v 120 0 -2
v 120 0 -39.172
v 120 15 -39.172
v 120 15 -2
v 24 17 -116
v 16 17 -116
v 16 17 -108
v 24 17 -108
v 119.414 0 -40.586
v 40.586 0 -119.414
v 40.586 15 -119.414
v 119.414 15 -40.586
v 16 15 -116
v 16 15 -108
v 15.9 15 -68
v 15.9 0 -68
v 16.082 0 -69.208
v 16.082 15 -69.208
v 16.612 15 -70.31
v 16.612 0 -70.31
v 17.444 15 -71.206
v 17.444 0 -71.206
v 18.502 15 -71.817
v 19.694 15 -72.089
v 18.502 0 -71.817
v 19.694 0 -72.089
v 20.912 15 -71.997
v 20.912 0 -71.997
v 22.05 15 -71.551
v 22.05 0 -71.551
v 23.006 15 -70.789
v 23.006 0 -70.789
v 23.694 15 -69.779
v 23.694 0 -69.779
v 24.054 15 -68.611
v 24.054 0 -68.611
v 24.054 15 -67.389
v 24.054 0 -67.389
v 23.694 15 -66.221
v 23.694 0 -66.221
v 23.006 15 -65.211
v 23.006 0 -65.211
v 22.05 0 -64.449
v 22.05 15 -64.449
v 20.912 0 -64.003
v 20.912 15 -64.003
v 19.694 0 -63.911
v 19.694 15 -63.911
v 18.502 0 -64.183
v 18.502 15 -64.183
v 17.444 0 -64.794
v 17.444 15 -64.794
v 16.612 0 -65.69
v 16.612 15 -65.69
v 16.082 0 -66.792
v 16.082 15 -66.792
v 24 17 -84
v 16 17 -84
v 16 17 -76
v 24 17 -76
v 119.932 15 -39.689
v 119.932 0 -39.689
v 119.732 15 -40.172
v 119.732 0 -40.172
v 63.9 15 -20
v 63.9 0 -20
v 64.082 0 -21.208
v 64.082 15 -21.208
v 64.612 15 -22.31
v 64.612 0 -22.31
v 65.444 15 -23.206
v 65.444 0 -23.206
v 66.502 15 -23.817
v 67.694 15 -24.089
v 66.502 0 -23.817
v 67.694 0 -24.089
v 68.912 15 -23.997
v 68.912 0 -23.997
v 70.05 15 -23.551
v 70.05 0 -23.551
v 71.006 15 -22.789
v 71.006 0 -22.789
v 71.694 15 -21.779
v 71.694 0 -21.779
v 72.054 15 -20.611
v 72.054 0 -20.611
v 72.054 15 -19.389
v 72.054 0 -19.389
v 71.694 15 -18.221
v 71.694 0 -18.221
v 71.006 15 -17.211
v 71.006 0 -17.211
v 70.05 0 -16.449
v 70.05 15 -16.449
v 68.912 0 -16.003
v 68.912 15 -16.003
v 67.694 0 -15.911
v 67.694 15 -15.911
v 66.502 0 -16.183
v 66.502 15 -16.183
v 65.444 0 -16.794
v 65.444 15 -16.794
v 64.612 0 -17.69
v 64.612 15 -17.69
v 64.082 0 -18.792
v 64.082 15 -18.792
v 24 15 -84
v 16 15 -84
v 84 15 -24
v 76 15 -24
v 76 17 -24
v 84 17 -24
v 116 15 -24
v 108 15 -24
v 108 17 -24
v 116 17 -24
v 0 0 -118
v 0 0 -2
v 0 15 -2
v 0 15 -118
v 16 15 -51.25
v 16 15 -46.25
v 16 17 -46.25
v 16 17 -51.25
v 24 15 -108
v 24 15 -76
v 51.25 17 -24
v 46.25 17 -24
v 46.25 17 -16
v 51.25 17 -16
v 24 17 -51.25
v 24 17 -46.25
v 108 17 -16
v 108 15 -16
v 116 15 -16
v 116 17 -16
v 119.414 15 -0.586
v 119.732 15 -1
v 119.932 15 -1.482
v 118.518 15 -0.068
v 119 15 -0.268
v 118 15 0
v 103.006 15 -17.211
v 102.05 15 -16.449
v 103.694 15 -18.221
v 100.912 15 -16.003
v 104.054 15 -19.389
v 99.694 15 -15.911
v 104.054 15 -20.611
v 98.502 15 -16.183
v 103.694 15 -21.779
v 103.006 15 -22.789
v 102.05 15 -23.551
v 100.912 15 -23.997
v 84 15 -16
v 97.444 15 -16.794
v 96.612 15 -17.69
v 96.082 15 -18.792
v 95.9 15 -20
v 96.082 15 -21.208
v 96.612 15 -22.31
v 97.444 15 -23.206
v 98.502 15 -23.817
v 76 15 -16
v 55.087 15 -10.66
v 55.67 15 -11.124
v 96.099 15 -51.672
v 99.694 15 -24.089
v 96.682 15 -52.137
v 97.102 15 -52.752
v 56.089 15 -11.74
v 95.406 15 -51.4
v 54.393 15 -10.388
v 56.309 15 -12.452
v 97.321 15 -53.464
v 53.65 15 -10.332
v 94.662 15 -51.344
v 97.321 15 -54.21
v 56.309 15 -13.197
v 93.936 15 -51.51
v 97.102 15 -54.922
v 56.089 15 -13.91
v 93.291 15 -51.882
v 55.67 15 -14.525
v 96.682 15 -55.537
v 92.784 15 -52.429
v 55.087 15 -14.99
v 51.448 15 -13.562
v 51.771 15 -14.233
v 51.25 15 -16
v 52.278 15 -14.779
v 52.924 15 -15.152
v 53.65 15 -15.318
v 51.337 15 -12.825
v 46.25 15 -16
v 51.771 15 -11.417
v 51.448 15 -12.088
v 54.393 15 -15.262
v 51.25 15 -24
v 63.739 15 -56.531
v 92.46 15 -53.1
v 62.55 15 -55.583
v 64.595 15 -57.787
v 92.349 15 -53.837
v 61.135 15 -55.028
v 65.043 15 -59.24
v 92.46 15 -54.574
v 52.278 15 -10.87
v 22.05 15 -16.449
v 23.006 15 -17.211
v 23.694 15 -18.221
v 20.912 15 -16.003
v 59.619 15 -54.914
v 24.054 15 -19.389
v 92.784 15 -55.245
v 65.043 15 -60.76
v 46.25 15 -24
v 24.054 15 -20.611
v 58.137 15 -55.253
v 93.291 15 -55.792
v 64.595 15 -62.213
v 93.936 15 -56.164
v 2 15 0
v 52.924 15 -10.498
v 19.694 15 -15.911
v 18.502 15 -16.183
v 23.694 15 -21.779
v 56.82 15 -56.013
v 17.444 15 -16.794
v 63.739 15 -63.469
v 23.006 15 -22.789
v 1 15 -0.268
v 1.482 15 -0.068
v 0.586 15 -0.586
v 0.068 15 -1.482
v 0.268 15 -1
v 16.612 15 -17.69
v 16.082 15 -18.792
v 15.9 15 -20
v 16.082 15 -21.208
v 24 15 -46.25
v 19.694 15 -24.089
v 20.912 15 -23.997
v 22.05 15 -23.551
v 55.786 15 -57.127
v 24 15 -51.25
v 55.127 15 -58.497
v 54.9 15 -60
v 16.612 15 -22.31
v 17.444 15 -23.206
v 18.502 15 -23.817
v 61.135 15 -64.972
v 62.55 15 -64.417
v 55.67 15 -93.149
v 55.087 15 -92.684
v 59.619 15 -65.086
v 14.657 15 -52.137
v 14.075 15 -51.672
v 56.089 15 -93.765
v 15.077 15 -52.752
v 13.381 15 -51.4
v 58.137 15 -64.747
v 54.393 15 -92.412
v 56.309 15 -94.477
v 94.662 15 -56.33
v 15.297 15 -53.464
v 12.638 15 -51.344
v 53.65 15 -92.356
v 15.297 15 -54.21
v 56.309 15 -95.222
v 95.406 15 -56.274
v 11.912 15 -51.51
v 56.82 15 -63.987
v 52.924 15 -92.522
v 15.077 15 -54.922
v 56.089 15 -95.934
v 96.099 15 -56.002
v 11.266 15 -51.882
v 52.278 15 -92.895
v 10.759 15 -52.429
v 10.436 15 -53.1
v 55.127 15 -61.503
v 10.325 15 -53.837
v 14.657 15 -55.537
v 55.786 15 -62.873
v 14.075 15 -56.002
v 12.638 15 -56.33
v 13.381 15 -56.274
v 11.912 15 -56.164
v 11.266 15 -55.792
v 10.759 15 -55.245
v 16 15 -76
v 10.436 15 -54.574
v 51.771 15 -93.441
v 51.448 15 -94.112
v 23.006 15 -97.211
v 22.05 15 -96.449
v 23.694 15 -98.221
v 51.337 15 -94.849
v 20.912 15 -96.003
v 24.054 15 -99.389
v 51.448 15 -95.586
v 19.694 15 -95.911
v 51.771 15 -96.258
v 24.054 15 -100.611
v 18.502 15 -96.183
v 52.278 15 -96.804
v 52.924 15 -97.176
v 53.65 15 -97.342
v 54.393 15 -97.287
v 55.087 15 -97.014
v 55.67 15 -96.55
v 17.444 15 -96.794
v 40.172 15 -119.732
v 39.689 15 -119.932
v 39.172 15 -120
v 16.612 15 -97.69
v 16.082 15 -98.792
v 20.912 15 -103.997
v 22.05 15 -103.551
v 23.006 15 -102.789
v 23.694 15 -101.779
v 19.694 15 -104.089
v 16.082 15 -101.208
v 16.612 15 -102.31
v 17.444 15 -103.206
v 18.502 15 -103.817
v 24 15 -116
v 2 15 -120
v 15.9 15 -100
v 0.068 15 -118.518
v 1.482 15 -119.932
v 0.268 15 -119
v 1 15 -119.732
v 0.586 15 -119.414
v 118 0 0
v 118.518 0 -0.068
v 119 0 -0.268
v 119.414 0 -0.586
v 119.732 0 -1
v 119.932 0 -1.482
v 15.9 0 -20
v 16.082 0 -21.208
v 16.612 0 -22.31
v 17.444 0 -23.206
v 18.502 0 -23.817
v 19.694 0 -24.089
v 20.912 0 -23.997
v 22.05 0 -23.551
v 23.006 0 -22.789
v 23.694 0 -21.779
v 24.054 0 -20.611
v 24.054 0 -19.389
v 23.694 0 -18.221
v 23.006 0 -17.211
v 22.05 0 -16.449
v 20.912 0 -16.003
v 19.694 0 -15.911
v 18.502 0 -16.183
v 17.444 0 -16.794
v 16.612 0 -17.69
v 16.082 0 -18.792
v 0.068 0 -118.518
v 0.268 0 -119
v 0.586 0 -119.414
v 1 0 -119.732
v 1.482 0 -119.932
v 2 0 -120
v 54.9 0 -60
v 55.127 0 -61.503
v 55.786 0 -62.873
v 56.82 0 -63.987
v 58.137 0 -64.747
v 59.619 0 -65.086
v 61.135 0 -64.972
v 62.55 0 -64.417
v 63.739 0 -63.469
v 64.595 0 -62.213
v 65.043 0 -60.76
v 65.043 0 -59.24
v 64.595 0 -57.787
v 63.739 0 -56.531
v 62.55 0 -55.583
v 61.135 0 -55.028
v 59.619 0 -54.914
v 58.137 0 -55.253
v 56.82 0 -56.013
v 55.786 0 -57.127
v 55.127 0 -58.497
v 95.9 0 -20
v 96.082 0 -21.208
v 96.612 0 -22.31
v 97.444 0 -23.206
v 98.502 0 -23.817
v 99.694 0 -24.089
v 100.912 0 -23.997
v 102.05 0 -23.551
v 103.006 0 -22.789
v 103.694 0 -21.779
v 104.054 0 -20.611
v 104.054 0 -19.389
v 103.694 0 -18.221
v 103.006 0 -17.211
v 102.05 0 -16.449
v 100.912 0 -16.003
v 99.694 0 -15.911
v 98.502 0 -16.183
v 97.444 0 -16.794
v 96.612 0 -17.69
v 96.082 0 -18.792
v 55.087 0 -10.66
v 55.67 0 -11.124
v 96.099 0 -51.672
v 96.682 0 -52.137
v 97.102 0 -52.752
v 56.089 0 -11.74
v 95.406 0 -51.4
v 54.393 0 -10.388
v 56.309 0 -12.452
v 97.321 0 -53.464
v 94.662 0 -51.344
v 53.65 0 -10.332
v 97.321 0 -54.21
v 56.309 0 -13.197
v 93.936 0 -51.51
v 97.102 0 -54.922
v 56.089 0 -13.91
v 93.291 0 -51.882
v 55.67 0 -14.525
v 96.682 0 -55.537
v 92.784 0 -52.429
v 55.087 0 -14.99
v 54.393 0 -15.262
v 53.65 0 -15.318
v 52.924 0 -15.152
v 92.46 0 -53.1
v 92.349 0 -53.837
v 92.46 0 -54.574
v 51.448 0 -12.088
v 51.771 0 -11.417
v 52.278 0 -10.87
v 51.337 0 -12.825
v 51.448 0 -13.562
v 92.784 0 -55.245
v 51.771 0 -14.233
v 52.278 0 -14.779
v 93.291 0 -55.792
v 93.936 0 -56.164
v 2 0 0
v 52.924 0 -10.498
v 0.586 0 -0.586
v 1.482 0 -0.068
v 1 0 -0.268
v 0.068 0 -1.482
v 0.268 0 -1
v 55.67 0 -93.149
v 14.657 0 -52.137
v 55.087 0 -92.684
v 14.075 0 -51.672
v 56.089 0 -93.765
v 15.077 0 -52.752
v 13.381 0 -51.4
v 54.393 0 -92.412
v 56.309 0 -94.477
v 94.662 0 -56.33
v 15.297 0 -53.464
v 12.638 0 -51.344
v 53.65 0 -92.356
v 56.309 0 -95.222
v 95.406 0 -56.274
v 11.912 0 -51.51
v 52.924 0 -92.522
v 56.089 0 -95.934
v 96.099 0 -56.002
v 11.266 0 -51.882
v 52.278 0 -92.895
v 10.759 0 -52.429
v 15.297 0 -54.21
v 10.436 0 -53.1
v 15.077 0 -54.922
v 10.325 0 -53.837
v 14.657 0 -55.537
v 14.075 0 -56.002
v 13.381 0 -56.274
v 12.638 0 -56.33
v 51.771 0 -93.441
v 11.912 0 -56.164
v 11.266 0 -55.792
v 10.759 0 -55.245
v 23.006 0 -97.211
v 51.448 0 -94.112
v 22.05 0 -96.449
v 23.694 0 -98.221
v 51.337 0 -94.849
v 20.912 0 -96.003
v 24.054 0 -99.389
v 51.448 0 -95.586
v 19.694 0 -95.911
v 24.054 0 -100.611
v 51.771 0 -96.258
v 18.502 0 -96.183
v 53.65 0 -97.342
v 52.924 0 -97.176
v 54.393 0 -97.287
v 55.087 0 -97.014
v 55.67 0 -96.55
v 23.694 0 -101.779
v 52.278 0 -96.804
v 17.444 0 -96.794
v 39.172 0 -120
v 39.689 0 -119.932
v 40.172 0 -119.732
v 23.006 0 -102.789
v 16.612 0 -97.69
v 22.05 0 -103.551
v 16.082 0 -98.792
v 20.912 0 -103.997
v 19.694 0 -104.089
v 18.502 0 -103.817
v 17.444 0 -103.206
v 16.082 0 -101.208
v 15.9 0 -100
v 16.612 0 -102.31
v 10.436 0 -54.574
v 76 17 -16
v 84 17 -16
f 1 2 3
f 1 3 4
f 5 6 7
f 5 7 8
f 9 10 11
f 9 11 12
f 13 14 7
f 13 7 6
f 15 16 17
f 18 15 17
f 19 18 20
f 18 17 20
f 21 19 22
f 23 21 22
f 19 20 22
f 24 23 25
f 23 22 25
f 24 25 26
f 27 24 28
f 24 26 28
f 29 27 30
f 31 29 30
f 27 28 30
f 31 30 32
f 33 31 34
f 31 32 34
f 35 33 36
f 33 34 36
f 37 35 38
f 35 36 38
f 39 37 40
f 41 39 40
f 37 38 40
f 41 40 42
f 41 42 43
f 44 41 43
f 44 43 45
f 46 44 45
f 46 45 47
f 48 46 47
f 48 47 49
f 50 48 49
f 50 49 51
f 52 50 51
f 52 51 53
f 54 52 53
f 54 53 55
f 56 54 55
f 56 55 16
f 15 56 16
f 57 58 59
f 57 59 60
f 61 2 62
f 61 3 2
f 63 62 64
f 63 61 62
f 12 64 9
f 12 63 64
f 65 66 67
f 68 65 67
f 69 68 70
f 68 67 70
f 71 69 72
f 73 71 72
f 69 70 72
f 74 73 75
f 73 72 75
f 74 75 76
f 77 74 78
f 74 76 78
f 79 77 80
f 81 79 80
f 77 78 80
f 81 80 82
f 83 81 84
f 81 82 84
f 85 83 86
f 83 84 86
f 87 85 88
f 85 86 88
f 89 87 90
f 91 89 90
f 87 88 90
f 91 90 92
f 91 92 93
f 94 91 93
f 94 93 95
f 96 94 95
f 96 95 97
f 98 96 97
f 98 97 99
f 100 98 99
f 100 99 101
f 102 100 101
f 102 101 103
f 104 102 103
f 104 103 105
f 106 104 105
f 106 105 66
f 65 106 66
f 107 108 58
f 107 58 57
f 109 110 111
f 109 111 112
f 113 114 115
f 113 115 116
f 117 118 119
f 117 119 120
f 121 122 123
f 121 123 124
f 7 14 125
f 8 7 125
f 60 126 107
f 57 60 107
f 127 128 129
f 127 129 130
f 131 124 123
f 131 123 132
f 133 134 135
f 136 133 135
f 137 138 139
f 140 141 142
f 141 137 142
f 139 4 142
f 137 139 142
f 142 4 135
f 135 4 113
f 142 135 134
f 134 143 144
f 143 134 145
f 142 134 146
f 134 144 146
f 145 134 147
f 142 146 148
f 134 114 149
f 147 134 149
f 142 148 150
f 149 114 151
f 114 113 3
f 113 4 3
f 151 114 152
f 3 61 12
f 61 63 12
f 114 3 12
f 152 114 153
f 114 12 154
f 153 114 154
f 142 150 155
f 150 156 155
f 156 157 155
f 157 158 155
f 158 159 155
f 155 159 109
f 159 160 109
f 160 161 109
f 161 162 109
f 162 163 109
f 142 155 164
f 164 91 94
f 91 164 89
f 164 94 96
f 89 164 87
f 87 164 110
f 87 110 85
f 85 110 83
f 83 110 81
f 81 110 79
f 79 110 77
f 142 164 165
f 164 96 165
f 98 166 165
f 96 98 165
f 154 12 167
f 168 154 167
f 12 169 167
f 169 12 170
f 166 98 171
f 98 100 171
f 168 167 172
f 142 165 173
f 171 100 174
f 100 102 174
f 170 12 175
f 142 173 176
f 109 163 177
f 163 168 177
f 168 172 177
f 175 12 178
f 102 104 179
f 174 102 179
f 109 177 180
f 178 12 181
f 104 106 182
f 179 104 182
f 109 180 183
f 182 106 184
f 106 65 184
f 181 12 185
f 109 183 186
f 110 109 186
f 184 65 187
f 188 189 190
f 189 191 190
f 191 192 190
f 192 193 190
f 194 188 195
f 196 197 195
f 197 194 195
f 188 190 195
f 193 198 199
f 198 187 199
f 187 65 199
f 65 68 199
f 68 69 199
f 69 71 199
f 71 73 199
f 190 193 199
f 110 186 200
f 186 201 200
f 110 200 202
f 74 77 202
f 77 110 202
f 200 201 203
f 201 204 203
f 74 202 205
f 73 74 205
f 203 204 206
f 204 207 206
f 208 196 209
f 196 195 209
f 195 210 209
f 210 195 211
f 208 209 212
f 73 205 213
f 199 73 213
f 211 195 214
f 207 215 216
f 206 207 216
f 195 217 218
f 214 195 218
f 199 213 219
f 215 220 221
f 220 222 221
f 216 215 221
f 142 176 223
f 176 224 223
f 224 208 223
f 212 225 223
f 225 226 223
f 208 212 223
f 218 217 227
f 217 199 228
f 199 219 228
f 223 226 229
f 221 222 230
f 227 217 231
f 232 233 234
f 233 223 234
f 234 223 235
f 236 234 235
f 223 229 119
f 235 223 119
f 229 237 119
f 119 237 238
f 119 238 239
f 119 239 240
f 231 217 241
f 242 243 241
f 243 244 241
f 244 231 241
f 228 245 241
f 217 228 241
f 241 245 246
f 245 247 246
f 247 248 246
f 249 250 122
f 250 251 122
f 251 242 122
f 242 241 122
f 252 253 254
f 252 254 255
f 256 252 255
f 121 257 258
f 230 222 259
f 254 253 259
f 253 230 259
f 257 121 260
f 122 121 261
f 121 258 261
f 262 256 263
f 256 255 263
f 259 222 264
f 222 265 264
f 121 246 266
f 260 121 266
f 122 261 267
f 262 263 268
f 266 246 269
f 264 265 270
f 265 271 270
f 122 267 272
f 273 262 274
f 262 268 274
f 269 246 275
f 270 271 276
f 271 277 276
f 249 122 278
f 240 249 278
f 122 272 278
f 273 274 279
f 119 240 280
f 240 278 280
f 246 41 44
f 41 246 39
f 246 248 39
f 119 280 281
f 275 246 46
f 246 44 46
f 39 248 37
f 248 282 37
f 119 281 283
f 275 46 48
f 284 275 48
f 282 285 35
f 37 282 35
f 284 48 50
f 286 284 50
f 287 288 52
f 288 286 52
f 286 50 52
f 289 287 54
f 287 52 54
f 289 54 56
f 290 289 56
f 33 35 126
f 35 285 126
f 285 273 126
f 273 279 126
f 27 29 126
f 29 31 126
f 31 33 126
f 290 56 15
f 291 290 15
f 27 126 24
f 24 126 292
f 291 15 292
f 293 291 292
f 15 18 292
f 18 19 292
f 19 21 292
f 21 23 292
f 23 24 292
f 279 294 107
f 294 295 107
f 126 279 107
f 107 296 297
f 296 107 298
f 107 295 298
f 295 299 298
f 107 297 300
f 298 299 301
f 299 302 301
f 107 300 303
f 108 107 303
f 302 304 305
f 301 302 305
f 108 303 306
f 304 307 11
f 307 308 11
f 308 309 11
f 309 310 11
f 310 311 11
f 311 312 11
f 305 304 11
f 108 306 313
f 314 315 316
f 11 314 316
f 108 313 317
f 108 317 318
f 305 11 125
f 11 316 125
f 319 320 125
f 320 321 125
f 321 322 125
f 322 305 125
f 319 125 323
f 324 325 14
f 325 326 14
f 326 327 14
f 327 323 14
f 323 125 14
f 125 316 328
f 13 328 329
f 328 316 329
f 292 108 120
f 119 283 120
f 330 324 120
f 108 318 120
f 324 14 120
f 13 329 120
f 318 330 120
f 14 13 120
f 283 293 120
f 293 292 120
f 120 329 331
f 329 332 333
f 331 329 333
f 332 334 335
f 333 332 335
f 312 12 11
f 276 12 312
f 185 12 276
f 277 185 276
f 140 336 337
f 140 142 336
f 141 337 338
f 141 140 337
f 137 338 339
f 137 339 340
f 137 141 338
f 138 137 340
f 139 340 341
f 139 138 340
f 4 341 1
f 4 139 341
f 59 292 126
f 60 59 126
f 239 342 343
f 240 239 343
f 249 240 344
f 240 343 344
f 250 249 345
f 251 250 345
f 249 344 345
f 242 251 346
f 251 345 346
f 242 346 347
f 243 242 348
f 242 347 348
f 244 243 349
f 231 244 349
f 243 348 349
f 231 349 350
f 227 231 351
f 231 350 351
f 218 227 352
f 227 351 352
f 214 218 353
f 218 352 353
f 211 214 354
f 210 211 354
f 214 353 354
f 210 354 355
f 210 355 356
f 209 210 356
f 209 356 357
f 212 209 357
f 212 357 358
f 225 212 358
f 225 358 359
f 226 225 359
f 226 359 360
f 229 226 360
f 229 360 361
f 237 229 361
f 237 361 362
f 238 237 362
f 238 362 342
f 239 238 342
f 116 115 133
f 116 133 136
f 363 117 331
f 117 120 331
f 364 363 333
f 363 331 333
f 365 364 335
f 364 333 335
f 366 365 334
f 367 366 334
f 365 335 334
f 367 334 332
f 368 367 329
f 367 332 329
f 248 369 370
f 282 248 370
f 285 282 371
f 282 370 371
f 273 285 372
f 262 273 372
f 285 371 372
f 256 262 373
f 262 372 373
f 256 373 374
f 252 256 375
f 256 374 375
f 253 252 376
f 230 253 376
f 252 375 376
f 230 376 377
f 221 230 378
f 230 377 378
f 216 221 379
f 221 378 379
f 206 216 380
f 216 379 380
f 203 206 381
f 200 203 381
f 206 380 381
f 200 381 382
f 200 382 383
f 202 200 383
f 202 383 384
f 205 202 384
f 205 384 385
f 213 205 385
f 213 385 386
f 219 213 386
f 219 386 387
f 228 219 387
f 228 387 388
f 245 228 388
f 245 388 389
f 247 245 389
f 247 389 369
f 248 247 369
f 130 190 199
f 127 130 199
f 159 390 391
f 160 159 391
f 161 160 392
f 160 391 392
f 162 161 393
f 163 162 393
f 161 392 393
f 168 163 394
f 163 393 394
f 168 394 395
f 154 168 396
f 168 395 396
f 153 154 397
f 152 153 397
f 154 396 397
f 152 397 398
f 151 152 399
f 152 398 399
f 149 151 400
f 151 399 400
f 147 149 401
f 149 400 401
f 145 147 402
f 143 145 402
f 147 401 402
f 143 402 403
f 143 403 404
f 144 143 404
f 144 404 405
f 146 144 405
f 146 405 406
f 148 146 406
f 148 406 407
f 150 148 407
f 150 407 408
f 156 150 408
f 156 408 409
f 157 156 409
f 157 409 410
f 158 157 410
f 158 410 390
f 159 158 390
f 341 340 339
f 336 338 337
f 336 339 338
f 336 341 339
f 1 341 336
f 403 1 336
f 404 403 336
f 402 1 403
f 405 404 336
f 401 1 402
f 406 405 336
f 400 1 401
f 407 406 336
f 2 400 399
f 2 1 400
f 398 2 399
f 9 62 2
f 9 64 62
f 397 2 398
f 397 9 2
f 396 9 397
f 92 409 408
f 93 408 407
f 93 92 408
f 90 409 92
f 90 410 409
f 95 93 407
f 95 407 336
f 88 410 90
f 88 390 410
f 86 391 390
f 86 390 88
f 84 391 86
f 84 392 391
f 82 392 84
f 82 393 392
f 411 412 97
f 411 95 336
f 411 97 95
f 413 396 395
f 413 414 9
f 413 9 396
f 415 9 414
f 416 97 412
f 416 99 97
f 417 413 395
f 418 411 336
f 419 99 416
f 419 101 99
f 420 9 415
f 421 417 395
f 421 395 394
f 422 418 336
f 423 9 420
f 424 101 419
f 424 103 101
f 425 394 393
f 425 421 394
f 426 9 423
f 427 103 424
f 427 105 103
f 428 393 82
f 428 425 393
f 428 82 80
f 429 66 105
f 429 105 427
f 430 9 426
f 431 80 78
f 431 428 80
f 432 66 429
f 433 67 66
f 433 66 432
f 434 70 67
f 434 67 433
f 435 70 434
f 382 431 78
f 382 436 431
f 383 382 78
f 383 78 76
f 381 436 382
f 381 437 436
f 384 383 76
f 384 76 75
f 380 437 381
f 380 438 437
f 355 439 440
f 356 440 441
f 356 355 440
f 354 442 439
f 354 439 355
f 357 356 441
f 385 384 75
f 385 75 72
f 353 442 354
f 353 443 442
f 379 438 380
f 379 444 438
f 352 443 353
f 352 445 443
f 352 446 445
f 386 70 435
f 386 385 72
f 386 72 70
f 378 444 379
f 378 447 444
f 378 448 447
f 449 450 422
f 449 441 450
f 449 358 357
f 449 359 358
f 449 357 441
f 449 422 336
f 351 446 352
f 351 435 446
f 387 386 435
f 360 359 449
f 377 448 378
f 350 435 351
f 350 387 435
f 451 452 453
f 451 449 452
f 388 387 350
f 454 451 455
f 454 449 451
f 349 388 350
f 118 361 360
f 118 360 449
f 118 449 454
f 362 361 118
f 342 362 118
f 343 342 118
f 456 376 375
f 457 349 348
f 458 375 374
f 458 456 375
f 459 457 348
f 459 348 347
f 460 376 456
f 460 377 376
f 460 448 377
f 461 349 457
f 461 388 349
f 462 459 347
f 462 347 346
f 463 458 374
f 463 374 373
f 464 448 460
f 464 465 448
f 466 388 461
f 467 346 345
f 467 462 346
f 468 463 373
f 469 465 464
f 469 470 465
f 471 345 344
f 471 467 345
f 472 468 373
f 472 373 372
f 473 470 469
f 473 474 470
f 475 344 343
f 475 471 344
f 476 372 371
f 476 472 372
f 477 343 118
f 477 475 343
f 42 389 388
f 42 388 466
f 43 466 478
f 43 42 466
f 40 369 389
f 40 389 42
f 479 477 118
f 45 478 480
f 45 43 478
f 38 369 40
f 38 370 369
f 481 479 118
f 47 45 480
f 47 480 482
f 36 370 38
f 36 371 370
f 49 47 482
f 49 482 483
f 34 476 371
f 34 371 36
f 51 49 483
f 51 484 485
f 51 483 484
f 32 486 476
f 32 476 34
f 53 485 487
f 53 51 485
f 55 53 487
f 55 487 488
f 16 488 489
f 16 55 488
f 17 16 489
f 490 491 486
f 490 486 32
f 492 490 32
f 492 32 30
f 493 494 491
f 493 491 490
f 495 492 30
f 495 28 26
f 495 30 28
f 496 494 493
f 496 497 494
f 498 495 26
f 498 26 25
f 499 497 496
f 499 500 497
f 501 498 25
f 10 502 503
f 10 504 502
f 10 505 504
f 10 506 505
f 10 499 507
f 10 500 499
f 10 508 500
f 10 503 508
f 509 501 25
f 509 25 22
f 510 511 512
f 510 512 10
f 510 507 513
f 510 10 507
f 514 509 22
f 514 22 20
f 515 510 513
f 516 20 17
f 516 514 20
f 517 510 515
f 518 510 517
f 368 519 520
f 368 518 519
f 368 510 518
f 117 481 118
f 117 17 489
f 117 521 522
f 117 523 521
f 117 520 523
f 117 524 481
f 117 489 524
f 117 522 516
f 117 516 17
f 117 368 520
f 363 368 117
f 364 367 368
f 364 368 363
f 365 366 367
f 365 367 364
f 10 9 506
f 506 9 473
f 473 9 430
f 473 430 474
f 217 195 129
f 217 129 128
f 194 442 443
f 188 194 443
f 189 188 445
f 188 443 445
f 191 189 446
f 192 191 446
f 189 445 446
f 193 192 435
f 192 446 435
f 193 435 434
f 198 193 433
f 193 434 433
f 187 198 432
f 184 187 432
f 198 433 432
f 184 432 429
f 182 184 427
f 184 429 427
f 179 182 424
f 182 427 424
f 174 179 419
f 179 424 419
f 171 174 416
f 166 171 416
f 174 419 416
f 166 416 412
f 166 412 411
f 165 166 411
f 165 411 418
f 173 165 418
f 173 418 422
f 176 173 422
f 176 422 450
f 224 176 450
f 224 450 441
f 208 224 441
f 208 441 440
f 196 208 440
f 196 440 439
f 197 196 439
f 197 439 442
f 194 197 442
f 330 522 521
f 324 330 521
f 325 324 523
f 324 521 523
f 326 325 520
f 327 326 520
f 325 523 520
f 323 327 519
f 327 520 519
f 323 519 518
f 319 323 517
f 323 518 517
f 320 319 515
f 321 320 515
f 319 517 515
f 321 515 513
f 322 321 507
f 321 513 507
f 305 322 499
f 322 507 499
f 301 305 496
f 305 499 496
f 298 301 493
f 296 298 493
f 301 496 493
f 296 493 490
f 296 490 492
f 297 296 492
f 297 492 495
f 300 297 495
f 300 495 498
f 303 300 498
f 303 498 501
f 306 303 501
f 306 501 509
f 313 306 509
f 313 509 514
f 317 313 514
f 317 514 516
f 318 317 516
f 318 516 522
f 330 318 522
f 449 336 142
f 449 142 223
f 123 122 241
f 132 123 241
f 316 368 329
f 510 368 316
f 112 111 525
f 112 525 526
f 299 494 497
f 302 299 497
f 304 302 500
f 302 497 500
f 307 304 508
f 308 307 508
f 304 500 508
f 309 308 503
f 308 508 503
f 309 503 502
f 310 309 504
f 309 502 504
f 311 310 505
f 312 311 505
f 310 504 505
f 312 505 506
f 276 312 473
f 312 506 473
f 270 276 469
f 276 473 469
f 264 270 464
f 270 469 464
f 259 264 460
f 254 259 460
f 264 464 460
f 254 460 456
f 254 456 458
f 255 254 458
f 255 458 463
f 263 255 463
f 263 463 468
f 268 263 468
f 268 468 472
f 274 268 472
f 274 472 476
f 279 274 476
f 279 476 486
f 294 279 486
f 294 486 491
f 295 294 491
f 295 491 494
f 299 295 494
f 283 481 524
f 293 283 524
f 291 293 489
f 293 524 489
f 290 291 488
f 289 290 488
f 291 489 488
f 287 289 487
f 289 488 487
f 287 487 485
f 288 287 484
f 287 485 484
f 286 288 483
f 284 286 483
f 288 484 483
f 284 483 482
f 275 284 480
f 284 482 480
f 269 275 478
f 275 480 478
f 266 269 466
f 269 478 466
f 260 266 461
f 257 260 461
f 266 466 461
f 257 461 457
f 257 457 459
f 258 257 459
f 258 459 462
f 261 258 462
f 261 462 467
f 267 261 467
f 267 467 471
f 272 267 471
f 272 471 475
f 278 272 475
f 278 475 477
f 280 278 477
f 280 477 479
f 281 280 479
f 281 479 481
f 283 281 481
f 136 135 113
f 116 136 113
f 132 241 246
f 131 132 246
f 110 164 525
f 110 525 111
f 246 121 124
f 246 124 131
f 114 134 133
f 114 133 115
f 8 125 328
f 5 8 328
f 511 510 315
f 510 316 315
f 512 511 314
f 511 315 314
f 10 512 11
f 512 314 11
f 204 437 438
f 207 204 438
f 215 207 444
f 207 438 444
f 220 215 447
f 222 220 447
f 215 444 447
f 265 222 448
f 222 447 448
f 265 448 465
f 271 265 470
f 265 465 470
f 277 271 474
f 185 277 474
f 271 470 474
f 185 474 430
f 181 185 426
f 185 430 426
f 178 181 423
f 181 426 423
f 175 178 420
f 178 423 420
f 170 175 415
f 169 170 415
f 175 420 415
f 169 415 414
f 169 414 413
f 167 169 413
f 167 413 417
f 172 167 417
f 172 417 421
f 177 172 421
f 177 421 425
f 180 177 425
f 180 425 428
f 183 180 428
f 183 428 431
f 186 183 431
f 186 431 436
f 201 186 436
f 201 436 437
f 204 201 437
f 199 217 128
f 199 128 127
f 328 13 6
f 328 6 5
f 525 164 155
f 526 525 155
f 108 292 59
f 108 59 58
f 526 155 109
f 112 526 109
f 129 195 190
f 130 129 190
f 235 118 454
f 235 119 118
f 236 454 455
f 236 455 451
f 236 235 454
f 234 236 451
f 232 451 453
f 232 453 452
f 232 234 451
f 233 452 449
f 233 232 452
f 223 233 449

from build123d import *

# Parameters (mm, degrees)
EXTRUDE_1_DEPTH             = 15
HOLE_WIZARD_M121_D          = 10.2
HOLE_WIZARD_M121_DEPTH      = 15
HOLE_WIZARD_M62_D           = 5
HOLE_WIZARD_M62_DEPTH       = 15
HOLE_WIZARD_8_2_8_2_1_D     = 8.2
HOLE_WIZARD_8_2_8_2_1_DEPTH = 15
SKETCH_9_W                  = 8
SKETCH_9_H                  = 8
SKETCH_9_H_2                = 5
SKETCH_9_W_2                = 5
EXTRUDE_2_DEPTH             = 2
FILLET_1_R                  = 2


with BuildPart() as part:
    # Эскиз1 → Бобышка-Вытянуть1 (new body)
    with BuildSketch(Plane(origin=(0, 0, 0), x_dir=(1, 0, 0), z_dir=(0, 1, 0))):
        Polygon((0, 0), (0, 120), (40, 120), (120, 40), (120, 0), align=None)
    extrude(amount=EXTRUDE_1_DEPTH)

    # Отверстие обработанное метчиком M121
    with Locations(Plane(origin=(0, 15, 0), x_dir=(1, 0, 0), z_dir=(0, 1, 0))):
        with Locations((60, 60)):
            Hole(HOLE_WIZARD_M121_D / 2, depth=HOLE_WIZARD_M121_DEPTH)

    # Отверстие обработанное метчиком M62
    with Locations(Plane(origin=(0, 15, 0), x_dir=(1, 0, 0), z_dir=(0, 1, 0))):
        with Locations((53.837049096, 94.849242405), (94.849242405, 53.837049096), (53.837049096, 12.824855787), (12.824855787, 53.837049096)):
            Hole(HOLE_WIZARD_M62_D / 2, depth=HOLE_WIZARD_M62_DEPTH)

    # Диаметр отверстия Ø8.2 (8.2)1
    with Locations(Plane(origin=(0, 15, 0), x_dir=(1, 0, 0), z_dir=(0, 1, 0))):
        with Locations((20, 100), (20, 68), (20, 20), (68, 20), (100, 20)):
            Hole(HOLE_WIZARD_8_2_8_2_1_D / 2, depth=HOLE_WIZARD_8_2_8_2_1_DEPTH)

    # Эскиз9 → Бобышка-Вытянуть2 (add)
    with BuildSketch(Plane(origin=(0, 15, 0), x_dir=(1, 0, 0), z_dir=(0, 1, 0))):
        with Locations((20, 112)):
            Rectangle(SKETCH_9_W, SKETCH_9_H)
        with Locations((20, 80)):
            Rectangle(SKETCH_9_W, SKETCH_9_H)
        with Locations((20, 48.75)):
            Rectangle(SKETCH_9_W, SKETCH_9_H_2)
        with Locations((48.75, 20)):
            Rectangle(SKETCH_9_W_2, SKETCH_9_H)
        with Locations((80, 20)):
            Rectangle(SKETCH_9_W, SKETCH_9_H)
        with Locations((112, 20)):
            Rectangle(SKETCH_9_W, SKETCH_9_H)
    extrude(amount=EXTRUDE_2_DEPTH)

    # Скругление1
    fillet_1_edges = [part.edges().sort_by_distance(p)[0] for p in [
        (0, 7.5, 0),
        (0, 7.5, -120),
        (40, 7.5, -120),
        (120, 7.5, -40),
        (120, 7.5, 0),
    ]]
    fillet(fillet_1_edges, radius=FILLET_1_R)


solid = part.part
